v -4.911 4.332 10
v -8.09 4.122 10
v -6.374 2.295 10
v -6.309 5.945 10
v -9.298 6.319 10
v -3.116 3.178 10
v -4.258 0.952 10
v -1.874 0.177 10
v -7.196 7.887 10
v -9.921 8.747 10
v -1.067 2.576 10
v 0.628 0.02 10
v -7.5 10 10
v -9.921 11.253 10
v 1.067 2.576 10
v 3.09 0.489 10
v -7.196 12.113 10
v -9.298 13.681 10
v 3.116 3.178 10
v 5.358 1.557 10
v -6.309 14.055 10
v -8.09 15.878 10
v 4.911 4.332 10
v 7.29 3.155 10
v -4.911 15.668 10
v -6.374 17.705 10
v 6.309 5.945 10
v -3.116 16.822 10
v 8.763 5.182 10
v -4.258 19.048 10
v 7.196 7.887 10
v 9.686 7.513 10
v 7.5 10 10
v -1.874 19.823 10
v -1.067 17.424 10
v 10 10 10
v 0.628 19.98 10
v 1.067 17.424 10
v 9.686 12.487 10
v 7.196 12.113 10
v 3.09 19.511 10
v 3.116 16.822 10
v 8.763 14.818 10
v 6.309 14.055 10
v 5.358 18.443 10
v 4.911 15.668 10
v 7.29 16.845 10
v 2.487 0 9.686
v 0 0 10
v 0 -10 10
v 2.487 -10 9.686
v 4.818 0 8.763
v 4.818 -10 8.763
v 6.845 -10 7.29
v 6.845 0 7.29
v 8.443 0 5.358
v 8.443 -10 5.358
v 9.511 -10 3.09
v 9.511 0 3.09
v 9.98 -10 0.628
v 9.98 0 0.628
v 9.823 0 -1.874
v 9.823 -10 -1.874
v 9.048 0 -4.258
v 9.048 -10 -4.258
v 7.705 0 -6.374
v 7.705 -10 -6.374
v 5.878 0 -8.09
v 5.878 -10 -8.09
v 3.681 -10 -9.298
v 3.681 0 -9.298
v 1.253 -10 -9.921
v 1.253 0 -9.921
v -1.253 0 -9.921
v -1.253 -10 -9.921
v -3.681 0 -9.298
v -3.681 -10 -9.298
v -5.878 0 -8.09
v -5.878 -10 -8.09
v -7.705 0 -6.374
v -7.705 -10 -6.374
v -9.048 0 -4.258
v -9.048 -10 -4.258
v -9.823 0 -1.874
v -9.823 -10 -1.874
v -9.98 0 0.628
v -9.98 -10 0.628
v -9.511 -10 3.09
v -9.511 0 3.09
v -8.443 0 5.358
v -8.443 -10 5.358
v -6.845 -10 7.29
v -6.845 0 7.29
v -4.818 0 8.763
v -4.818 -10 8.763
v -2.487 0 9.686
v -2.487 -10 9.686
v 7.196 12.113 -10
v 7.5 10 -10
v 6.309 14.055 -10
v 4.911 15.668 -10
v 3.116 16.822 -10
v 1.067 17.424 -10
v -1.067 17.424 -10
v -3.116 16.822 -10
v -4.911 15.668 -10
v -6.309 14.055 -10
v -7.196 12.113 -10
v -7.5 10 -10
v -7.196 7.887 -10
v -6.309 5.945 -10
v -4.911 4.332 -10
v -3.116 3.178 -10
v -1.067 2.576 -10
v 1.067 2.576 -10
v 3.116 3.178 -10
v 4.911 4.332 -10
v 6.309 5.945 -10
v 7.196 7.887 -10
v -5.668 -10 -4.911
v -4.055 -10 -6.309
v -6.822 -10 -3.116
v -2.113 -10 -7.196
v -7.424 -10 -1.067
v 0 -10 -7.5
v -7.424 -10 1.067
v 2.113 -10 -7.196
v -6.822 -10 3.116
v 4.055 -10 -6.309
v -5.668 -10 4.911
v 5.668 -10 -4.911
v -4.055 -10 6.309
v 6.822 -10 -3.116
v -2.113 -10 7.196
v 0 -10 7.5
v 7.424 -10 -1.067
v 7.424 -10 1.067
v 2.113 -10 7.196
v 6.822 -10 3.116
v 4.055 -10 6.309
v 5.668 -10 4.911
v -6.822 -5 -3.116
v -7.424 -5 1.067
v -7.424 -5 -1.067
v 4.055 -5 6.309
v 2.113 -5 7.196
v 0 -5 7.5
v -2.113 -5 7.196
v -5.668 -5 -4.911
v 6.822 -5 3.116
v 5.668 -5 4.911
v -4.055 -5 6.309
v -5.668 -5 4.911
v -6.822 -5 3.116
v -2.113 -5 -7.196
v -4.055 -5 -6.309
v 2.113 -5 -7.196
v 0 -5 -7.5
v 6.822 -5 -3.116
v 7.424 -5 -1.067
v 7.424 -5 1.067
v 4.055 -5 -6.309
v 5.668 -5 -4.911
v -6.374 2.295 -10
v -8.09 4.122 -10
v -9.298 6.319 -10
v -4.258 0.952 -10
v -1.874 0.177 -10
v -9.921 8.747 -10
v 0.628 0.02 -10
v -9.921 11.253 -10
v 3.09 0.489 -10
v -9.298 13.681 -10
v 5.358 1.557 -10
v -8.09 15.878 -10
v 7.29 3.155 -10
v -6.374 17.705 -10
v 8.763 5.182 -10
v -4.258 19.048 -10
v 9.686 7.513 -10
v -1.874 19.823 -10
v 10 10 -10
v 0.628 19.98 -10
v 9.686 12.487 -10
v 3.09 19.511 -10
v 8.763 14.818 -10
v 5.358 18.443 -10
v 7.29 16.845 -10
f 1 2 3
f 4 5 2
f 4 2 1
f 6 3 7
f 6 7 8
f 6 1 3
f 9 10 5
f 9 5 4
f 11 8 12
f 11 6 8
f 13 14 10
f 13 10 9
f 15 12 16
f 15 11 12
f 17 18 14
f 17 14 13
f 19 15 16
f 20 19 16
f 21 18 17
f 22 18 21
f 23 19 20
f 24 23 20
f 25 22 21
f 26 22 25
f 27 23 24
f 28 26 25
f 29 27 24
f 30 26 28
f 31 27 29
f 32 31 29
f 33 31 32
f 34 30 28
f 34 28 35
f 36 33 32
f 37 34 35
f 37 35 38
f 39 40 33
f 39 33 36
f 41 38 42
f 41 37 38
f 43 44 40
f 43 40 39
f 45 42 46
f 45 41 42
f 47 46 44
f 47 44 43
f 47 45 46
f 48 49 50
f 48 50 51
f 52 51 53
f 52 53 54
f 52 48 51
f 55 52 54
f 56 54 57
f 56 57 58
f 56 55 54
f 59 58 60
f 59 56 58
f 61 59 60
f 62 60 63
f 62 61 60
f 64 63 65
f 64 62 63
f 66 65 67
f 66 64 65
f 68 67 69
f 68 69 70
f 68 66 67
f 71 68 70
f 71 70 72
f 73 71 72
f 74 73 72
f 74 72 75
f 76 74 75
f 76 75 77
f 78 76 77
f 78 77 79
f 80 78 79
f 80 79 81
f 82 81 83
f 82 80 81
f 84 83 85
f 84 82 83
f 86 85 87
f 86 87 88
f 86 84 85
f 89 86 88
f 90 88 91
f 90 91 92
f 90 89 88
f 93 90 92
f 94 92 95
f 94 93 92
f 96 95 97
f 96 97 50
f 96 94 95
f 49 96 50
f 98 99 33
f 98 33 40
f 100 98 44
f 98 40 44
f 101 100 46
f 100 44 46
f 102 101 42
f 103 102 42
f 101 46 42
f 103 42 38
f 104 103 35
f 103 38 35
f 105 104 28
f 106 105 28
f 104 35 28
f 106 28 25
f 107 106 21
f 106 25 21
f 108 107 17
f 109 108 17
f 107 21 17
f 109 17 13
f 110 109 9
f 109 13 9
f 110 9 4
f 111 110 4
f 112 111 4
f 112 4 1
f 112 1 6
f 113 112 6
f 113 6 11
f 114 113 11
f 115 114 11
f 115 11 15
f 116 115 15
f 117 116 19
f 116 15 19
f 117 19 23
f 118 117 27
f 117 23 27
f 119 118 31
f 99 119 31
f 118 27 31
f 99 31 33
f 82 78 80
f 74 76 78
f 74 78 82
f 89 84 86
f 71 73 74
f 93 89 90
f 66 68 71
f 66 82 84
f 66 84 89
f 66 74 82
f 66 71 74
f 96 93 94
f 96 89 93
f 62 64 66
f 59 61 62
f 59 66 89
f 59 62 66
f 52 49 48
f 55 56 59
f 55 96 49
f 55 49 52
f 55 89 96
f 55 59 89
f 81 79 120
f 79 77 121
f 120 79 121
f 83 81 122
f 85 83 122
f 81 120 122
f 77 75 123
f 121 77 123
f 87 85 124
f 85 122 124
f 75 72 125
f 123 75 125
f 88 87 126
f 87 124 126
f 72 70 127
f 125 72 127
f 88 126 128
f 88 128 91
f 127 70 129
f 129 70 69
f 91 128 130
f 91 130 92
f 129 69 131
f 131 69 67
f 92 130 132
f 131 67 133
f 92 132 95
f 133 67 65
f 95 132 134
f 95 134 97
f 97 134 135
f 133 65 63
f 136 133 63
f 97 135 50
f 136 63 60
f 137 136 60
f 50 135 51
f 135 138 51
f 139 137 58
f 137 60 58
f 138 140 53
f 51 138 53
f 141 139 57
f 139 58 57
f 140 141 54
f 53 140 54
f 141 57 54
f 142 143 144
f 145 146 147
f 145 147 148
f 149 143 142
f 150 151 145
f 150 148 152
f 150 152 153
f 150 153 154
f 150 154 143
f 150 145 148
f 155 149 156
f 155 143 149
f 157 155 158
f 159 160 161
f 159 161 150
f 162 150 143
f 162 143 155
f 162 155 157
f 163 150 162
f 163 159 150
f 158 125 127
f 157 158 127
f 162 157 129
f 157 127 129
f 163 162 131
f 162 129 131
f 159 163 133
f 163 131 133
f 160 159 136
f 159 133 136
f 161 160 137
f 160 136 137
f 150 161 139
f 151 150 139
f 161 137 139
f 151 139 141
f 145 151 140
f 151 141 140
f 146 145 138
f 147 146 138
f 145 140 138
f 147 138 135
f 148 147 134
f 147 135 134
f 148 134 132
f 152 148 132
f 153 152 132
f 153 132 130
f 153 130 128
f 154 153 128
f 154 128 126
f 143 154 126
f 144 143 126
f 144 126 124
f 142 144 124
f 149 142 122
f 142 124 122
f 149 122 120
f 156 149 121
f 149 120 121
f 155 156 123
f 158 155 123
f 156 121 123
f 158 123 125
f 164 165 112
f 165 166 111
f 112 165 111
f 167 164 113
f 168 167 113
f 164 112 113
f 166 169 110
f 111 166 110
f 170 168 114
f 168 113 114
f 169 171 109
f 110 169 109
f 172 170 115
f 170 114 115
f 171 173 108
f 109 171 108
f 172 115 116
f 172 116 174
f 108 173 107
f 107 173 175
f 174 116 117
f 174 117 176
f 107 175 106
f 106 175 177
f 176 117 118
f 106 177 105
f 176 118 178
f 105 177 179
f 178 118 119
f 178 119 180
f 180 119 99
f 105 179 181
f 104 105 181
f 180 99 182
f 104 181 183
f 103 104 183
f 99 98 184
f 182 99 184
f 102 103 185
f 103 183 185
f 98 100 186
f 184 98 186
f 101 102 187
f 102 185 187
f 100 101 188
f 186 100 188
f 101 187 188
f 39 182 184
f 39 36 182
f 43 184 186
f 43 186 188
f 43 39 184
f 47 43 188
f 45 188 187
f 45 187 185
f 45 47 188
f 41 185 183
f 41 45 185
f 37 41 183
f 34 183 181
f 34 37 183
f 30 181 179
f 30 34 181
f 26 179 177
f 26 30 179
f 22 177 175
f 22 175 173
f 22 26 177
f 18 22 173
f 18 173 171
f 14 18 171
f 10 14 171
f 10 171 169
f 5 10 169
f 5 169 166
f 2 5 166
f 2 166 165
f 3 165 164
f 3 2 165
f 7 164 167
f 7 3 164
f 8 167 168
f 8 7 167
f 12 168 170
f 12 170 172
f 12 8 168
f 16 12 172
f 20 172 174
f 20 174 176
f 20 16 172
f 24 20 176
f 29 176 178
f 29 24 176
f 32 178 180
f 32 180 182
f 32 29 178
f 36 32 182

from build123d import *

# Parameters (mm, degrees)
SKETCH2_R           = 10
BOSS_EXTRUDE2_DEPTH = 10
SKETCH3_R           = 7.5
CUT_EXTRUDE1_DEPTH  = 5
SKETCH5_R           = 10
BOSS_EXTRUDE3_DEPTH = 10
SKETCH6_R           = 7.5
CUT_EXTRUDE2_DEPTH  = 20


with BuildPart() as part:
    # Sketch2 → Boss-Extrude2 (new body)
    with BuildSketch(Plane(origin=(0, 0, 0), x_dir=(1, 0, 0), z_dir=(0, 1, 0))):
        with Locations(Location((0, 0, 0), (0, 0, 270))):
            Circle(SKETCH2_R)
    extrude(amount=-BOSS_EXTRUDE2_DEPTH)

    # Sketch3 → Cut-Extrude1 (cut)
    with BuildSketch(Plane(origin=(0, -10, 0), x_dir=(-1, 0, 0), z_dir=(0, -1, 0))):
        with Locations(Location((0, 0, 0), (0, 0, 90))):
            Circle(SKETCH3_R)
    extrude(amount=-CUT_EXTRUDE1_DEPTH, mode=Mode.SUBTRACT)


with BuildPart() as body_2:
    # Sketch5 → Boss-Extrude3 (new, symmetric)
    with BuildSketch(Plane.XY):
        with Locations((0, 10)):
            Circle(SKETCH5_R)
    extrude(amount=BOSS_EXTRUDE3_DEPTH, both=True)

    # Sketch6 → Cut-Extrude2 (cut)
    with BuildSketch(Plane.XY.offset(10)):
        with Locations((0, 10)):
            Circle(SKETCH6_R)
    extrude(amount=-CUT_EXTRUDE2_DEPTH, mode=Mode.SUBTRACT)


solid = Compound([part.part, body_2.part])
